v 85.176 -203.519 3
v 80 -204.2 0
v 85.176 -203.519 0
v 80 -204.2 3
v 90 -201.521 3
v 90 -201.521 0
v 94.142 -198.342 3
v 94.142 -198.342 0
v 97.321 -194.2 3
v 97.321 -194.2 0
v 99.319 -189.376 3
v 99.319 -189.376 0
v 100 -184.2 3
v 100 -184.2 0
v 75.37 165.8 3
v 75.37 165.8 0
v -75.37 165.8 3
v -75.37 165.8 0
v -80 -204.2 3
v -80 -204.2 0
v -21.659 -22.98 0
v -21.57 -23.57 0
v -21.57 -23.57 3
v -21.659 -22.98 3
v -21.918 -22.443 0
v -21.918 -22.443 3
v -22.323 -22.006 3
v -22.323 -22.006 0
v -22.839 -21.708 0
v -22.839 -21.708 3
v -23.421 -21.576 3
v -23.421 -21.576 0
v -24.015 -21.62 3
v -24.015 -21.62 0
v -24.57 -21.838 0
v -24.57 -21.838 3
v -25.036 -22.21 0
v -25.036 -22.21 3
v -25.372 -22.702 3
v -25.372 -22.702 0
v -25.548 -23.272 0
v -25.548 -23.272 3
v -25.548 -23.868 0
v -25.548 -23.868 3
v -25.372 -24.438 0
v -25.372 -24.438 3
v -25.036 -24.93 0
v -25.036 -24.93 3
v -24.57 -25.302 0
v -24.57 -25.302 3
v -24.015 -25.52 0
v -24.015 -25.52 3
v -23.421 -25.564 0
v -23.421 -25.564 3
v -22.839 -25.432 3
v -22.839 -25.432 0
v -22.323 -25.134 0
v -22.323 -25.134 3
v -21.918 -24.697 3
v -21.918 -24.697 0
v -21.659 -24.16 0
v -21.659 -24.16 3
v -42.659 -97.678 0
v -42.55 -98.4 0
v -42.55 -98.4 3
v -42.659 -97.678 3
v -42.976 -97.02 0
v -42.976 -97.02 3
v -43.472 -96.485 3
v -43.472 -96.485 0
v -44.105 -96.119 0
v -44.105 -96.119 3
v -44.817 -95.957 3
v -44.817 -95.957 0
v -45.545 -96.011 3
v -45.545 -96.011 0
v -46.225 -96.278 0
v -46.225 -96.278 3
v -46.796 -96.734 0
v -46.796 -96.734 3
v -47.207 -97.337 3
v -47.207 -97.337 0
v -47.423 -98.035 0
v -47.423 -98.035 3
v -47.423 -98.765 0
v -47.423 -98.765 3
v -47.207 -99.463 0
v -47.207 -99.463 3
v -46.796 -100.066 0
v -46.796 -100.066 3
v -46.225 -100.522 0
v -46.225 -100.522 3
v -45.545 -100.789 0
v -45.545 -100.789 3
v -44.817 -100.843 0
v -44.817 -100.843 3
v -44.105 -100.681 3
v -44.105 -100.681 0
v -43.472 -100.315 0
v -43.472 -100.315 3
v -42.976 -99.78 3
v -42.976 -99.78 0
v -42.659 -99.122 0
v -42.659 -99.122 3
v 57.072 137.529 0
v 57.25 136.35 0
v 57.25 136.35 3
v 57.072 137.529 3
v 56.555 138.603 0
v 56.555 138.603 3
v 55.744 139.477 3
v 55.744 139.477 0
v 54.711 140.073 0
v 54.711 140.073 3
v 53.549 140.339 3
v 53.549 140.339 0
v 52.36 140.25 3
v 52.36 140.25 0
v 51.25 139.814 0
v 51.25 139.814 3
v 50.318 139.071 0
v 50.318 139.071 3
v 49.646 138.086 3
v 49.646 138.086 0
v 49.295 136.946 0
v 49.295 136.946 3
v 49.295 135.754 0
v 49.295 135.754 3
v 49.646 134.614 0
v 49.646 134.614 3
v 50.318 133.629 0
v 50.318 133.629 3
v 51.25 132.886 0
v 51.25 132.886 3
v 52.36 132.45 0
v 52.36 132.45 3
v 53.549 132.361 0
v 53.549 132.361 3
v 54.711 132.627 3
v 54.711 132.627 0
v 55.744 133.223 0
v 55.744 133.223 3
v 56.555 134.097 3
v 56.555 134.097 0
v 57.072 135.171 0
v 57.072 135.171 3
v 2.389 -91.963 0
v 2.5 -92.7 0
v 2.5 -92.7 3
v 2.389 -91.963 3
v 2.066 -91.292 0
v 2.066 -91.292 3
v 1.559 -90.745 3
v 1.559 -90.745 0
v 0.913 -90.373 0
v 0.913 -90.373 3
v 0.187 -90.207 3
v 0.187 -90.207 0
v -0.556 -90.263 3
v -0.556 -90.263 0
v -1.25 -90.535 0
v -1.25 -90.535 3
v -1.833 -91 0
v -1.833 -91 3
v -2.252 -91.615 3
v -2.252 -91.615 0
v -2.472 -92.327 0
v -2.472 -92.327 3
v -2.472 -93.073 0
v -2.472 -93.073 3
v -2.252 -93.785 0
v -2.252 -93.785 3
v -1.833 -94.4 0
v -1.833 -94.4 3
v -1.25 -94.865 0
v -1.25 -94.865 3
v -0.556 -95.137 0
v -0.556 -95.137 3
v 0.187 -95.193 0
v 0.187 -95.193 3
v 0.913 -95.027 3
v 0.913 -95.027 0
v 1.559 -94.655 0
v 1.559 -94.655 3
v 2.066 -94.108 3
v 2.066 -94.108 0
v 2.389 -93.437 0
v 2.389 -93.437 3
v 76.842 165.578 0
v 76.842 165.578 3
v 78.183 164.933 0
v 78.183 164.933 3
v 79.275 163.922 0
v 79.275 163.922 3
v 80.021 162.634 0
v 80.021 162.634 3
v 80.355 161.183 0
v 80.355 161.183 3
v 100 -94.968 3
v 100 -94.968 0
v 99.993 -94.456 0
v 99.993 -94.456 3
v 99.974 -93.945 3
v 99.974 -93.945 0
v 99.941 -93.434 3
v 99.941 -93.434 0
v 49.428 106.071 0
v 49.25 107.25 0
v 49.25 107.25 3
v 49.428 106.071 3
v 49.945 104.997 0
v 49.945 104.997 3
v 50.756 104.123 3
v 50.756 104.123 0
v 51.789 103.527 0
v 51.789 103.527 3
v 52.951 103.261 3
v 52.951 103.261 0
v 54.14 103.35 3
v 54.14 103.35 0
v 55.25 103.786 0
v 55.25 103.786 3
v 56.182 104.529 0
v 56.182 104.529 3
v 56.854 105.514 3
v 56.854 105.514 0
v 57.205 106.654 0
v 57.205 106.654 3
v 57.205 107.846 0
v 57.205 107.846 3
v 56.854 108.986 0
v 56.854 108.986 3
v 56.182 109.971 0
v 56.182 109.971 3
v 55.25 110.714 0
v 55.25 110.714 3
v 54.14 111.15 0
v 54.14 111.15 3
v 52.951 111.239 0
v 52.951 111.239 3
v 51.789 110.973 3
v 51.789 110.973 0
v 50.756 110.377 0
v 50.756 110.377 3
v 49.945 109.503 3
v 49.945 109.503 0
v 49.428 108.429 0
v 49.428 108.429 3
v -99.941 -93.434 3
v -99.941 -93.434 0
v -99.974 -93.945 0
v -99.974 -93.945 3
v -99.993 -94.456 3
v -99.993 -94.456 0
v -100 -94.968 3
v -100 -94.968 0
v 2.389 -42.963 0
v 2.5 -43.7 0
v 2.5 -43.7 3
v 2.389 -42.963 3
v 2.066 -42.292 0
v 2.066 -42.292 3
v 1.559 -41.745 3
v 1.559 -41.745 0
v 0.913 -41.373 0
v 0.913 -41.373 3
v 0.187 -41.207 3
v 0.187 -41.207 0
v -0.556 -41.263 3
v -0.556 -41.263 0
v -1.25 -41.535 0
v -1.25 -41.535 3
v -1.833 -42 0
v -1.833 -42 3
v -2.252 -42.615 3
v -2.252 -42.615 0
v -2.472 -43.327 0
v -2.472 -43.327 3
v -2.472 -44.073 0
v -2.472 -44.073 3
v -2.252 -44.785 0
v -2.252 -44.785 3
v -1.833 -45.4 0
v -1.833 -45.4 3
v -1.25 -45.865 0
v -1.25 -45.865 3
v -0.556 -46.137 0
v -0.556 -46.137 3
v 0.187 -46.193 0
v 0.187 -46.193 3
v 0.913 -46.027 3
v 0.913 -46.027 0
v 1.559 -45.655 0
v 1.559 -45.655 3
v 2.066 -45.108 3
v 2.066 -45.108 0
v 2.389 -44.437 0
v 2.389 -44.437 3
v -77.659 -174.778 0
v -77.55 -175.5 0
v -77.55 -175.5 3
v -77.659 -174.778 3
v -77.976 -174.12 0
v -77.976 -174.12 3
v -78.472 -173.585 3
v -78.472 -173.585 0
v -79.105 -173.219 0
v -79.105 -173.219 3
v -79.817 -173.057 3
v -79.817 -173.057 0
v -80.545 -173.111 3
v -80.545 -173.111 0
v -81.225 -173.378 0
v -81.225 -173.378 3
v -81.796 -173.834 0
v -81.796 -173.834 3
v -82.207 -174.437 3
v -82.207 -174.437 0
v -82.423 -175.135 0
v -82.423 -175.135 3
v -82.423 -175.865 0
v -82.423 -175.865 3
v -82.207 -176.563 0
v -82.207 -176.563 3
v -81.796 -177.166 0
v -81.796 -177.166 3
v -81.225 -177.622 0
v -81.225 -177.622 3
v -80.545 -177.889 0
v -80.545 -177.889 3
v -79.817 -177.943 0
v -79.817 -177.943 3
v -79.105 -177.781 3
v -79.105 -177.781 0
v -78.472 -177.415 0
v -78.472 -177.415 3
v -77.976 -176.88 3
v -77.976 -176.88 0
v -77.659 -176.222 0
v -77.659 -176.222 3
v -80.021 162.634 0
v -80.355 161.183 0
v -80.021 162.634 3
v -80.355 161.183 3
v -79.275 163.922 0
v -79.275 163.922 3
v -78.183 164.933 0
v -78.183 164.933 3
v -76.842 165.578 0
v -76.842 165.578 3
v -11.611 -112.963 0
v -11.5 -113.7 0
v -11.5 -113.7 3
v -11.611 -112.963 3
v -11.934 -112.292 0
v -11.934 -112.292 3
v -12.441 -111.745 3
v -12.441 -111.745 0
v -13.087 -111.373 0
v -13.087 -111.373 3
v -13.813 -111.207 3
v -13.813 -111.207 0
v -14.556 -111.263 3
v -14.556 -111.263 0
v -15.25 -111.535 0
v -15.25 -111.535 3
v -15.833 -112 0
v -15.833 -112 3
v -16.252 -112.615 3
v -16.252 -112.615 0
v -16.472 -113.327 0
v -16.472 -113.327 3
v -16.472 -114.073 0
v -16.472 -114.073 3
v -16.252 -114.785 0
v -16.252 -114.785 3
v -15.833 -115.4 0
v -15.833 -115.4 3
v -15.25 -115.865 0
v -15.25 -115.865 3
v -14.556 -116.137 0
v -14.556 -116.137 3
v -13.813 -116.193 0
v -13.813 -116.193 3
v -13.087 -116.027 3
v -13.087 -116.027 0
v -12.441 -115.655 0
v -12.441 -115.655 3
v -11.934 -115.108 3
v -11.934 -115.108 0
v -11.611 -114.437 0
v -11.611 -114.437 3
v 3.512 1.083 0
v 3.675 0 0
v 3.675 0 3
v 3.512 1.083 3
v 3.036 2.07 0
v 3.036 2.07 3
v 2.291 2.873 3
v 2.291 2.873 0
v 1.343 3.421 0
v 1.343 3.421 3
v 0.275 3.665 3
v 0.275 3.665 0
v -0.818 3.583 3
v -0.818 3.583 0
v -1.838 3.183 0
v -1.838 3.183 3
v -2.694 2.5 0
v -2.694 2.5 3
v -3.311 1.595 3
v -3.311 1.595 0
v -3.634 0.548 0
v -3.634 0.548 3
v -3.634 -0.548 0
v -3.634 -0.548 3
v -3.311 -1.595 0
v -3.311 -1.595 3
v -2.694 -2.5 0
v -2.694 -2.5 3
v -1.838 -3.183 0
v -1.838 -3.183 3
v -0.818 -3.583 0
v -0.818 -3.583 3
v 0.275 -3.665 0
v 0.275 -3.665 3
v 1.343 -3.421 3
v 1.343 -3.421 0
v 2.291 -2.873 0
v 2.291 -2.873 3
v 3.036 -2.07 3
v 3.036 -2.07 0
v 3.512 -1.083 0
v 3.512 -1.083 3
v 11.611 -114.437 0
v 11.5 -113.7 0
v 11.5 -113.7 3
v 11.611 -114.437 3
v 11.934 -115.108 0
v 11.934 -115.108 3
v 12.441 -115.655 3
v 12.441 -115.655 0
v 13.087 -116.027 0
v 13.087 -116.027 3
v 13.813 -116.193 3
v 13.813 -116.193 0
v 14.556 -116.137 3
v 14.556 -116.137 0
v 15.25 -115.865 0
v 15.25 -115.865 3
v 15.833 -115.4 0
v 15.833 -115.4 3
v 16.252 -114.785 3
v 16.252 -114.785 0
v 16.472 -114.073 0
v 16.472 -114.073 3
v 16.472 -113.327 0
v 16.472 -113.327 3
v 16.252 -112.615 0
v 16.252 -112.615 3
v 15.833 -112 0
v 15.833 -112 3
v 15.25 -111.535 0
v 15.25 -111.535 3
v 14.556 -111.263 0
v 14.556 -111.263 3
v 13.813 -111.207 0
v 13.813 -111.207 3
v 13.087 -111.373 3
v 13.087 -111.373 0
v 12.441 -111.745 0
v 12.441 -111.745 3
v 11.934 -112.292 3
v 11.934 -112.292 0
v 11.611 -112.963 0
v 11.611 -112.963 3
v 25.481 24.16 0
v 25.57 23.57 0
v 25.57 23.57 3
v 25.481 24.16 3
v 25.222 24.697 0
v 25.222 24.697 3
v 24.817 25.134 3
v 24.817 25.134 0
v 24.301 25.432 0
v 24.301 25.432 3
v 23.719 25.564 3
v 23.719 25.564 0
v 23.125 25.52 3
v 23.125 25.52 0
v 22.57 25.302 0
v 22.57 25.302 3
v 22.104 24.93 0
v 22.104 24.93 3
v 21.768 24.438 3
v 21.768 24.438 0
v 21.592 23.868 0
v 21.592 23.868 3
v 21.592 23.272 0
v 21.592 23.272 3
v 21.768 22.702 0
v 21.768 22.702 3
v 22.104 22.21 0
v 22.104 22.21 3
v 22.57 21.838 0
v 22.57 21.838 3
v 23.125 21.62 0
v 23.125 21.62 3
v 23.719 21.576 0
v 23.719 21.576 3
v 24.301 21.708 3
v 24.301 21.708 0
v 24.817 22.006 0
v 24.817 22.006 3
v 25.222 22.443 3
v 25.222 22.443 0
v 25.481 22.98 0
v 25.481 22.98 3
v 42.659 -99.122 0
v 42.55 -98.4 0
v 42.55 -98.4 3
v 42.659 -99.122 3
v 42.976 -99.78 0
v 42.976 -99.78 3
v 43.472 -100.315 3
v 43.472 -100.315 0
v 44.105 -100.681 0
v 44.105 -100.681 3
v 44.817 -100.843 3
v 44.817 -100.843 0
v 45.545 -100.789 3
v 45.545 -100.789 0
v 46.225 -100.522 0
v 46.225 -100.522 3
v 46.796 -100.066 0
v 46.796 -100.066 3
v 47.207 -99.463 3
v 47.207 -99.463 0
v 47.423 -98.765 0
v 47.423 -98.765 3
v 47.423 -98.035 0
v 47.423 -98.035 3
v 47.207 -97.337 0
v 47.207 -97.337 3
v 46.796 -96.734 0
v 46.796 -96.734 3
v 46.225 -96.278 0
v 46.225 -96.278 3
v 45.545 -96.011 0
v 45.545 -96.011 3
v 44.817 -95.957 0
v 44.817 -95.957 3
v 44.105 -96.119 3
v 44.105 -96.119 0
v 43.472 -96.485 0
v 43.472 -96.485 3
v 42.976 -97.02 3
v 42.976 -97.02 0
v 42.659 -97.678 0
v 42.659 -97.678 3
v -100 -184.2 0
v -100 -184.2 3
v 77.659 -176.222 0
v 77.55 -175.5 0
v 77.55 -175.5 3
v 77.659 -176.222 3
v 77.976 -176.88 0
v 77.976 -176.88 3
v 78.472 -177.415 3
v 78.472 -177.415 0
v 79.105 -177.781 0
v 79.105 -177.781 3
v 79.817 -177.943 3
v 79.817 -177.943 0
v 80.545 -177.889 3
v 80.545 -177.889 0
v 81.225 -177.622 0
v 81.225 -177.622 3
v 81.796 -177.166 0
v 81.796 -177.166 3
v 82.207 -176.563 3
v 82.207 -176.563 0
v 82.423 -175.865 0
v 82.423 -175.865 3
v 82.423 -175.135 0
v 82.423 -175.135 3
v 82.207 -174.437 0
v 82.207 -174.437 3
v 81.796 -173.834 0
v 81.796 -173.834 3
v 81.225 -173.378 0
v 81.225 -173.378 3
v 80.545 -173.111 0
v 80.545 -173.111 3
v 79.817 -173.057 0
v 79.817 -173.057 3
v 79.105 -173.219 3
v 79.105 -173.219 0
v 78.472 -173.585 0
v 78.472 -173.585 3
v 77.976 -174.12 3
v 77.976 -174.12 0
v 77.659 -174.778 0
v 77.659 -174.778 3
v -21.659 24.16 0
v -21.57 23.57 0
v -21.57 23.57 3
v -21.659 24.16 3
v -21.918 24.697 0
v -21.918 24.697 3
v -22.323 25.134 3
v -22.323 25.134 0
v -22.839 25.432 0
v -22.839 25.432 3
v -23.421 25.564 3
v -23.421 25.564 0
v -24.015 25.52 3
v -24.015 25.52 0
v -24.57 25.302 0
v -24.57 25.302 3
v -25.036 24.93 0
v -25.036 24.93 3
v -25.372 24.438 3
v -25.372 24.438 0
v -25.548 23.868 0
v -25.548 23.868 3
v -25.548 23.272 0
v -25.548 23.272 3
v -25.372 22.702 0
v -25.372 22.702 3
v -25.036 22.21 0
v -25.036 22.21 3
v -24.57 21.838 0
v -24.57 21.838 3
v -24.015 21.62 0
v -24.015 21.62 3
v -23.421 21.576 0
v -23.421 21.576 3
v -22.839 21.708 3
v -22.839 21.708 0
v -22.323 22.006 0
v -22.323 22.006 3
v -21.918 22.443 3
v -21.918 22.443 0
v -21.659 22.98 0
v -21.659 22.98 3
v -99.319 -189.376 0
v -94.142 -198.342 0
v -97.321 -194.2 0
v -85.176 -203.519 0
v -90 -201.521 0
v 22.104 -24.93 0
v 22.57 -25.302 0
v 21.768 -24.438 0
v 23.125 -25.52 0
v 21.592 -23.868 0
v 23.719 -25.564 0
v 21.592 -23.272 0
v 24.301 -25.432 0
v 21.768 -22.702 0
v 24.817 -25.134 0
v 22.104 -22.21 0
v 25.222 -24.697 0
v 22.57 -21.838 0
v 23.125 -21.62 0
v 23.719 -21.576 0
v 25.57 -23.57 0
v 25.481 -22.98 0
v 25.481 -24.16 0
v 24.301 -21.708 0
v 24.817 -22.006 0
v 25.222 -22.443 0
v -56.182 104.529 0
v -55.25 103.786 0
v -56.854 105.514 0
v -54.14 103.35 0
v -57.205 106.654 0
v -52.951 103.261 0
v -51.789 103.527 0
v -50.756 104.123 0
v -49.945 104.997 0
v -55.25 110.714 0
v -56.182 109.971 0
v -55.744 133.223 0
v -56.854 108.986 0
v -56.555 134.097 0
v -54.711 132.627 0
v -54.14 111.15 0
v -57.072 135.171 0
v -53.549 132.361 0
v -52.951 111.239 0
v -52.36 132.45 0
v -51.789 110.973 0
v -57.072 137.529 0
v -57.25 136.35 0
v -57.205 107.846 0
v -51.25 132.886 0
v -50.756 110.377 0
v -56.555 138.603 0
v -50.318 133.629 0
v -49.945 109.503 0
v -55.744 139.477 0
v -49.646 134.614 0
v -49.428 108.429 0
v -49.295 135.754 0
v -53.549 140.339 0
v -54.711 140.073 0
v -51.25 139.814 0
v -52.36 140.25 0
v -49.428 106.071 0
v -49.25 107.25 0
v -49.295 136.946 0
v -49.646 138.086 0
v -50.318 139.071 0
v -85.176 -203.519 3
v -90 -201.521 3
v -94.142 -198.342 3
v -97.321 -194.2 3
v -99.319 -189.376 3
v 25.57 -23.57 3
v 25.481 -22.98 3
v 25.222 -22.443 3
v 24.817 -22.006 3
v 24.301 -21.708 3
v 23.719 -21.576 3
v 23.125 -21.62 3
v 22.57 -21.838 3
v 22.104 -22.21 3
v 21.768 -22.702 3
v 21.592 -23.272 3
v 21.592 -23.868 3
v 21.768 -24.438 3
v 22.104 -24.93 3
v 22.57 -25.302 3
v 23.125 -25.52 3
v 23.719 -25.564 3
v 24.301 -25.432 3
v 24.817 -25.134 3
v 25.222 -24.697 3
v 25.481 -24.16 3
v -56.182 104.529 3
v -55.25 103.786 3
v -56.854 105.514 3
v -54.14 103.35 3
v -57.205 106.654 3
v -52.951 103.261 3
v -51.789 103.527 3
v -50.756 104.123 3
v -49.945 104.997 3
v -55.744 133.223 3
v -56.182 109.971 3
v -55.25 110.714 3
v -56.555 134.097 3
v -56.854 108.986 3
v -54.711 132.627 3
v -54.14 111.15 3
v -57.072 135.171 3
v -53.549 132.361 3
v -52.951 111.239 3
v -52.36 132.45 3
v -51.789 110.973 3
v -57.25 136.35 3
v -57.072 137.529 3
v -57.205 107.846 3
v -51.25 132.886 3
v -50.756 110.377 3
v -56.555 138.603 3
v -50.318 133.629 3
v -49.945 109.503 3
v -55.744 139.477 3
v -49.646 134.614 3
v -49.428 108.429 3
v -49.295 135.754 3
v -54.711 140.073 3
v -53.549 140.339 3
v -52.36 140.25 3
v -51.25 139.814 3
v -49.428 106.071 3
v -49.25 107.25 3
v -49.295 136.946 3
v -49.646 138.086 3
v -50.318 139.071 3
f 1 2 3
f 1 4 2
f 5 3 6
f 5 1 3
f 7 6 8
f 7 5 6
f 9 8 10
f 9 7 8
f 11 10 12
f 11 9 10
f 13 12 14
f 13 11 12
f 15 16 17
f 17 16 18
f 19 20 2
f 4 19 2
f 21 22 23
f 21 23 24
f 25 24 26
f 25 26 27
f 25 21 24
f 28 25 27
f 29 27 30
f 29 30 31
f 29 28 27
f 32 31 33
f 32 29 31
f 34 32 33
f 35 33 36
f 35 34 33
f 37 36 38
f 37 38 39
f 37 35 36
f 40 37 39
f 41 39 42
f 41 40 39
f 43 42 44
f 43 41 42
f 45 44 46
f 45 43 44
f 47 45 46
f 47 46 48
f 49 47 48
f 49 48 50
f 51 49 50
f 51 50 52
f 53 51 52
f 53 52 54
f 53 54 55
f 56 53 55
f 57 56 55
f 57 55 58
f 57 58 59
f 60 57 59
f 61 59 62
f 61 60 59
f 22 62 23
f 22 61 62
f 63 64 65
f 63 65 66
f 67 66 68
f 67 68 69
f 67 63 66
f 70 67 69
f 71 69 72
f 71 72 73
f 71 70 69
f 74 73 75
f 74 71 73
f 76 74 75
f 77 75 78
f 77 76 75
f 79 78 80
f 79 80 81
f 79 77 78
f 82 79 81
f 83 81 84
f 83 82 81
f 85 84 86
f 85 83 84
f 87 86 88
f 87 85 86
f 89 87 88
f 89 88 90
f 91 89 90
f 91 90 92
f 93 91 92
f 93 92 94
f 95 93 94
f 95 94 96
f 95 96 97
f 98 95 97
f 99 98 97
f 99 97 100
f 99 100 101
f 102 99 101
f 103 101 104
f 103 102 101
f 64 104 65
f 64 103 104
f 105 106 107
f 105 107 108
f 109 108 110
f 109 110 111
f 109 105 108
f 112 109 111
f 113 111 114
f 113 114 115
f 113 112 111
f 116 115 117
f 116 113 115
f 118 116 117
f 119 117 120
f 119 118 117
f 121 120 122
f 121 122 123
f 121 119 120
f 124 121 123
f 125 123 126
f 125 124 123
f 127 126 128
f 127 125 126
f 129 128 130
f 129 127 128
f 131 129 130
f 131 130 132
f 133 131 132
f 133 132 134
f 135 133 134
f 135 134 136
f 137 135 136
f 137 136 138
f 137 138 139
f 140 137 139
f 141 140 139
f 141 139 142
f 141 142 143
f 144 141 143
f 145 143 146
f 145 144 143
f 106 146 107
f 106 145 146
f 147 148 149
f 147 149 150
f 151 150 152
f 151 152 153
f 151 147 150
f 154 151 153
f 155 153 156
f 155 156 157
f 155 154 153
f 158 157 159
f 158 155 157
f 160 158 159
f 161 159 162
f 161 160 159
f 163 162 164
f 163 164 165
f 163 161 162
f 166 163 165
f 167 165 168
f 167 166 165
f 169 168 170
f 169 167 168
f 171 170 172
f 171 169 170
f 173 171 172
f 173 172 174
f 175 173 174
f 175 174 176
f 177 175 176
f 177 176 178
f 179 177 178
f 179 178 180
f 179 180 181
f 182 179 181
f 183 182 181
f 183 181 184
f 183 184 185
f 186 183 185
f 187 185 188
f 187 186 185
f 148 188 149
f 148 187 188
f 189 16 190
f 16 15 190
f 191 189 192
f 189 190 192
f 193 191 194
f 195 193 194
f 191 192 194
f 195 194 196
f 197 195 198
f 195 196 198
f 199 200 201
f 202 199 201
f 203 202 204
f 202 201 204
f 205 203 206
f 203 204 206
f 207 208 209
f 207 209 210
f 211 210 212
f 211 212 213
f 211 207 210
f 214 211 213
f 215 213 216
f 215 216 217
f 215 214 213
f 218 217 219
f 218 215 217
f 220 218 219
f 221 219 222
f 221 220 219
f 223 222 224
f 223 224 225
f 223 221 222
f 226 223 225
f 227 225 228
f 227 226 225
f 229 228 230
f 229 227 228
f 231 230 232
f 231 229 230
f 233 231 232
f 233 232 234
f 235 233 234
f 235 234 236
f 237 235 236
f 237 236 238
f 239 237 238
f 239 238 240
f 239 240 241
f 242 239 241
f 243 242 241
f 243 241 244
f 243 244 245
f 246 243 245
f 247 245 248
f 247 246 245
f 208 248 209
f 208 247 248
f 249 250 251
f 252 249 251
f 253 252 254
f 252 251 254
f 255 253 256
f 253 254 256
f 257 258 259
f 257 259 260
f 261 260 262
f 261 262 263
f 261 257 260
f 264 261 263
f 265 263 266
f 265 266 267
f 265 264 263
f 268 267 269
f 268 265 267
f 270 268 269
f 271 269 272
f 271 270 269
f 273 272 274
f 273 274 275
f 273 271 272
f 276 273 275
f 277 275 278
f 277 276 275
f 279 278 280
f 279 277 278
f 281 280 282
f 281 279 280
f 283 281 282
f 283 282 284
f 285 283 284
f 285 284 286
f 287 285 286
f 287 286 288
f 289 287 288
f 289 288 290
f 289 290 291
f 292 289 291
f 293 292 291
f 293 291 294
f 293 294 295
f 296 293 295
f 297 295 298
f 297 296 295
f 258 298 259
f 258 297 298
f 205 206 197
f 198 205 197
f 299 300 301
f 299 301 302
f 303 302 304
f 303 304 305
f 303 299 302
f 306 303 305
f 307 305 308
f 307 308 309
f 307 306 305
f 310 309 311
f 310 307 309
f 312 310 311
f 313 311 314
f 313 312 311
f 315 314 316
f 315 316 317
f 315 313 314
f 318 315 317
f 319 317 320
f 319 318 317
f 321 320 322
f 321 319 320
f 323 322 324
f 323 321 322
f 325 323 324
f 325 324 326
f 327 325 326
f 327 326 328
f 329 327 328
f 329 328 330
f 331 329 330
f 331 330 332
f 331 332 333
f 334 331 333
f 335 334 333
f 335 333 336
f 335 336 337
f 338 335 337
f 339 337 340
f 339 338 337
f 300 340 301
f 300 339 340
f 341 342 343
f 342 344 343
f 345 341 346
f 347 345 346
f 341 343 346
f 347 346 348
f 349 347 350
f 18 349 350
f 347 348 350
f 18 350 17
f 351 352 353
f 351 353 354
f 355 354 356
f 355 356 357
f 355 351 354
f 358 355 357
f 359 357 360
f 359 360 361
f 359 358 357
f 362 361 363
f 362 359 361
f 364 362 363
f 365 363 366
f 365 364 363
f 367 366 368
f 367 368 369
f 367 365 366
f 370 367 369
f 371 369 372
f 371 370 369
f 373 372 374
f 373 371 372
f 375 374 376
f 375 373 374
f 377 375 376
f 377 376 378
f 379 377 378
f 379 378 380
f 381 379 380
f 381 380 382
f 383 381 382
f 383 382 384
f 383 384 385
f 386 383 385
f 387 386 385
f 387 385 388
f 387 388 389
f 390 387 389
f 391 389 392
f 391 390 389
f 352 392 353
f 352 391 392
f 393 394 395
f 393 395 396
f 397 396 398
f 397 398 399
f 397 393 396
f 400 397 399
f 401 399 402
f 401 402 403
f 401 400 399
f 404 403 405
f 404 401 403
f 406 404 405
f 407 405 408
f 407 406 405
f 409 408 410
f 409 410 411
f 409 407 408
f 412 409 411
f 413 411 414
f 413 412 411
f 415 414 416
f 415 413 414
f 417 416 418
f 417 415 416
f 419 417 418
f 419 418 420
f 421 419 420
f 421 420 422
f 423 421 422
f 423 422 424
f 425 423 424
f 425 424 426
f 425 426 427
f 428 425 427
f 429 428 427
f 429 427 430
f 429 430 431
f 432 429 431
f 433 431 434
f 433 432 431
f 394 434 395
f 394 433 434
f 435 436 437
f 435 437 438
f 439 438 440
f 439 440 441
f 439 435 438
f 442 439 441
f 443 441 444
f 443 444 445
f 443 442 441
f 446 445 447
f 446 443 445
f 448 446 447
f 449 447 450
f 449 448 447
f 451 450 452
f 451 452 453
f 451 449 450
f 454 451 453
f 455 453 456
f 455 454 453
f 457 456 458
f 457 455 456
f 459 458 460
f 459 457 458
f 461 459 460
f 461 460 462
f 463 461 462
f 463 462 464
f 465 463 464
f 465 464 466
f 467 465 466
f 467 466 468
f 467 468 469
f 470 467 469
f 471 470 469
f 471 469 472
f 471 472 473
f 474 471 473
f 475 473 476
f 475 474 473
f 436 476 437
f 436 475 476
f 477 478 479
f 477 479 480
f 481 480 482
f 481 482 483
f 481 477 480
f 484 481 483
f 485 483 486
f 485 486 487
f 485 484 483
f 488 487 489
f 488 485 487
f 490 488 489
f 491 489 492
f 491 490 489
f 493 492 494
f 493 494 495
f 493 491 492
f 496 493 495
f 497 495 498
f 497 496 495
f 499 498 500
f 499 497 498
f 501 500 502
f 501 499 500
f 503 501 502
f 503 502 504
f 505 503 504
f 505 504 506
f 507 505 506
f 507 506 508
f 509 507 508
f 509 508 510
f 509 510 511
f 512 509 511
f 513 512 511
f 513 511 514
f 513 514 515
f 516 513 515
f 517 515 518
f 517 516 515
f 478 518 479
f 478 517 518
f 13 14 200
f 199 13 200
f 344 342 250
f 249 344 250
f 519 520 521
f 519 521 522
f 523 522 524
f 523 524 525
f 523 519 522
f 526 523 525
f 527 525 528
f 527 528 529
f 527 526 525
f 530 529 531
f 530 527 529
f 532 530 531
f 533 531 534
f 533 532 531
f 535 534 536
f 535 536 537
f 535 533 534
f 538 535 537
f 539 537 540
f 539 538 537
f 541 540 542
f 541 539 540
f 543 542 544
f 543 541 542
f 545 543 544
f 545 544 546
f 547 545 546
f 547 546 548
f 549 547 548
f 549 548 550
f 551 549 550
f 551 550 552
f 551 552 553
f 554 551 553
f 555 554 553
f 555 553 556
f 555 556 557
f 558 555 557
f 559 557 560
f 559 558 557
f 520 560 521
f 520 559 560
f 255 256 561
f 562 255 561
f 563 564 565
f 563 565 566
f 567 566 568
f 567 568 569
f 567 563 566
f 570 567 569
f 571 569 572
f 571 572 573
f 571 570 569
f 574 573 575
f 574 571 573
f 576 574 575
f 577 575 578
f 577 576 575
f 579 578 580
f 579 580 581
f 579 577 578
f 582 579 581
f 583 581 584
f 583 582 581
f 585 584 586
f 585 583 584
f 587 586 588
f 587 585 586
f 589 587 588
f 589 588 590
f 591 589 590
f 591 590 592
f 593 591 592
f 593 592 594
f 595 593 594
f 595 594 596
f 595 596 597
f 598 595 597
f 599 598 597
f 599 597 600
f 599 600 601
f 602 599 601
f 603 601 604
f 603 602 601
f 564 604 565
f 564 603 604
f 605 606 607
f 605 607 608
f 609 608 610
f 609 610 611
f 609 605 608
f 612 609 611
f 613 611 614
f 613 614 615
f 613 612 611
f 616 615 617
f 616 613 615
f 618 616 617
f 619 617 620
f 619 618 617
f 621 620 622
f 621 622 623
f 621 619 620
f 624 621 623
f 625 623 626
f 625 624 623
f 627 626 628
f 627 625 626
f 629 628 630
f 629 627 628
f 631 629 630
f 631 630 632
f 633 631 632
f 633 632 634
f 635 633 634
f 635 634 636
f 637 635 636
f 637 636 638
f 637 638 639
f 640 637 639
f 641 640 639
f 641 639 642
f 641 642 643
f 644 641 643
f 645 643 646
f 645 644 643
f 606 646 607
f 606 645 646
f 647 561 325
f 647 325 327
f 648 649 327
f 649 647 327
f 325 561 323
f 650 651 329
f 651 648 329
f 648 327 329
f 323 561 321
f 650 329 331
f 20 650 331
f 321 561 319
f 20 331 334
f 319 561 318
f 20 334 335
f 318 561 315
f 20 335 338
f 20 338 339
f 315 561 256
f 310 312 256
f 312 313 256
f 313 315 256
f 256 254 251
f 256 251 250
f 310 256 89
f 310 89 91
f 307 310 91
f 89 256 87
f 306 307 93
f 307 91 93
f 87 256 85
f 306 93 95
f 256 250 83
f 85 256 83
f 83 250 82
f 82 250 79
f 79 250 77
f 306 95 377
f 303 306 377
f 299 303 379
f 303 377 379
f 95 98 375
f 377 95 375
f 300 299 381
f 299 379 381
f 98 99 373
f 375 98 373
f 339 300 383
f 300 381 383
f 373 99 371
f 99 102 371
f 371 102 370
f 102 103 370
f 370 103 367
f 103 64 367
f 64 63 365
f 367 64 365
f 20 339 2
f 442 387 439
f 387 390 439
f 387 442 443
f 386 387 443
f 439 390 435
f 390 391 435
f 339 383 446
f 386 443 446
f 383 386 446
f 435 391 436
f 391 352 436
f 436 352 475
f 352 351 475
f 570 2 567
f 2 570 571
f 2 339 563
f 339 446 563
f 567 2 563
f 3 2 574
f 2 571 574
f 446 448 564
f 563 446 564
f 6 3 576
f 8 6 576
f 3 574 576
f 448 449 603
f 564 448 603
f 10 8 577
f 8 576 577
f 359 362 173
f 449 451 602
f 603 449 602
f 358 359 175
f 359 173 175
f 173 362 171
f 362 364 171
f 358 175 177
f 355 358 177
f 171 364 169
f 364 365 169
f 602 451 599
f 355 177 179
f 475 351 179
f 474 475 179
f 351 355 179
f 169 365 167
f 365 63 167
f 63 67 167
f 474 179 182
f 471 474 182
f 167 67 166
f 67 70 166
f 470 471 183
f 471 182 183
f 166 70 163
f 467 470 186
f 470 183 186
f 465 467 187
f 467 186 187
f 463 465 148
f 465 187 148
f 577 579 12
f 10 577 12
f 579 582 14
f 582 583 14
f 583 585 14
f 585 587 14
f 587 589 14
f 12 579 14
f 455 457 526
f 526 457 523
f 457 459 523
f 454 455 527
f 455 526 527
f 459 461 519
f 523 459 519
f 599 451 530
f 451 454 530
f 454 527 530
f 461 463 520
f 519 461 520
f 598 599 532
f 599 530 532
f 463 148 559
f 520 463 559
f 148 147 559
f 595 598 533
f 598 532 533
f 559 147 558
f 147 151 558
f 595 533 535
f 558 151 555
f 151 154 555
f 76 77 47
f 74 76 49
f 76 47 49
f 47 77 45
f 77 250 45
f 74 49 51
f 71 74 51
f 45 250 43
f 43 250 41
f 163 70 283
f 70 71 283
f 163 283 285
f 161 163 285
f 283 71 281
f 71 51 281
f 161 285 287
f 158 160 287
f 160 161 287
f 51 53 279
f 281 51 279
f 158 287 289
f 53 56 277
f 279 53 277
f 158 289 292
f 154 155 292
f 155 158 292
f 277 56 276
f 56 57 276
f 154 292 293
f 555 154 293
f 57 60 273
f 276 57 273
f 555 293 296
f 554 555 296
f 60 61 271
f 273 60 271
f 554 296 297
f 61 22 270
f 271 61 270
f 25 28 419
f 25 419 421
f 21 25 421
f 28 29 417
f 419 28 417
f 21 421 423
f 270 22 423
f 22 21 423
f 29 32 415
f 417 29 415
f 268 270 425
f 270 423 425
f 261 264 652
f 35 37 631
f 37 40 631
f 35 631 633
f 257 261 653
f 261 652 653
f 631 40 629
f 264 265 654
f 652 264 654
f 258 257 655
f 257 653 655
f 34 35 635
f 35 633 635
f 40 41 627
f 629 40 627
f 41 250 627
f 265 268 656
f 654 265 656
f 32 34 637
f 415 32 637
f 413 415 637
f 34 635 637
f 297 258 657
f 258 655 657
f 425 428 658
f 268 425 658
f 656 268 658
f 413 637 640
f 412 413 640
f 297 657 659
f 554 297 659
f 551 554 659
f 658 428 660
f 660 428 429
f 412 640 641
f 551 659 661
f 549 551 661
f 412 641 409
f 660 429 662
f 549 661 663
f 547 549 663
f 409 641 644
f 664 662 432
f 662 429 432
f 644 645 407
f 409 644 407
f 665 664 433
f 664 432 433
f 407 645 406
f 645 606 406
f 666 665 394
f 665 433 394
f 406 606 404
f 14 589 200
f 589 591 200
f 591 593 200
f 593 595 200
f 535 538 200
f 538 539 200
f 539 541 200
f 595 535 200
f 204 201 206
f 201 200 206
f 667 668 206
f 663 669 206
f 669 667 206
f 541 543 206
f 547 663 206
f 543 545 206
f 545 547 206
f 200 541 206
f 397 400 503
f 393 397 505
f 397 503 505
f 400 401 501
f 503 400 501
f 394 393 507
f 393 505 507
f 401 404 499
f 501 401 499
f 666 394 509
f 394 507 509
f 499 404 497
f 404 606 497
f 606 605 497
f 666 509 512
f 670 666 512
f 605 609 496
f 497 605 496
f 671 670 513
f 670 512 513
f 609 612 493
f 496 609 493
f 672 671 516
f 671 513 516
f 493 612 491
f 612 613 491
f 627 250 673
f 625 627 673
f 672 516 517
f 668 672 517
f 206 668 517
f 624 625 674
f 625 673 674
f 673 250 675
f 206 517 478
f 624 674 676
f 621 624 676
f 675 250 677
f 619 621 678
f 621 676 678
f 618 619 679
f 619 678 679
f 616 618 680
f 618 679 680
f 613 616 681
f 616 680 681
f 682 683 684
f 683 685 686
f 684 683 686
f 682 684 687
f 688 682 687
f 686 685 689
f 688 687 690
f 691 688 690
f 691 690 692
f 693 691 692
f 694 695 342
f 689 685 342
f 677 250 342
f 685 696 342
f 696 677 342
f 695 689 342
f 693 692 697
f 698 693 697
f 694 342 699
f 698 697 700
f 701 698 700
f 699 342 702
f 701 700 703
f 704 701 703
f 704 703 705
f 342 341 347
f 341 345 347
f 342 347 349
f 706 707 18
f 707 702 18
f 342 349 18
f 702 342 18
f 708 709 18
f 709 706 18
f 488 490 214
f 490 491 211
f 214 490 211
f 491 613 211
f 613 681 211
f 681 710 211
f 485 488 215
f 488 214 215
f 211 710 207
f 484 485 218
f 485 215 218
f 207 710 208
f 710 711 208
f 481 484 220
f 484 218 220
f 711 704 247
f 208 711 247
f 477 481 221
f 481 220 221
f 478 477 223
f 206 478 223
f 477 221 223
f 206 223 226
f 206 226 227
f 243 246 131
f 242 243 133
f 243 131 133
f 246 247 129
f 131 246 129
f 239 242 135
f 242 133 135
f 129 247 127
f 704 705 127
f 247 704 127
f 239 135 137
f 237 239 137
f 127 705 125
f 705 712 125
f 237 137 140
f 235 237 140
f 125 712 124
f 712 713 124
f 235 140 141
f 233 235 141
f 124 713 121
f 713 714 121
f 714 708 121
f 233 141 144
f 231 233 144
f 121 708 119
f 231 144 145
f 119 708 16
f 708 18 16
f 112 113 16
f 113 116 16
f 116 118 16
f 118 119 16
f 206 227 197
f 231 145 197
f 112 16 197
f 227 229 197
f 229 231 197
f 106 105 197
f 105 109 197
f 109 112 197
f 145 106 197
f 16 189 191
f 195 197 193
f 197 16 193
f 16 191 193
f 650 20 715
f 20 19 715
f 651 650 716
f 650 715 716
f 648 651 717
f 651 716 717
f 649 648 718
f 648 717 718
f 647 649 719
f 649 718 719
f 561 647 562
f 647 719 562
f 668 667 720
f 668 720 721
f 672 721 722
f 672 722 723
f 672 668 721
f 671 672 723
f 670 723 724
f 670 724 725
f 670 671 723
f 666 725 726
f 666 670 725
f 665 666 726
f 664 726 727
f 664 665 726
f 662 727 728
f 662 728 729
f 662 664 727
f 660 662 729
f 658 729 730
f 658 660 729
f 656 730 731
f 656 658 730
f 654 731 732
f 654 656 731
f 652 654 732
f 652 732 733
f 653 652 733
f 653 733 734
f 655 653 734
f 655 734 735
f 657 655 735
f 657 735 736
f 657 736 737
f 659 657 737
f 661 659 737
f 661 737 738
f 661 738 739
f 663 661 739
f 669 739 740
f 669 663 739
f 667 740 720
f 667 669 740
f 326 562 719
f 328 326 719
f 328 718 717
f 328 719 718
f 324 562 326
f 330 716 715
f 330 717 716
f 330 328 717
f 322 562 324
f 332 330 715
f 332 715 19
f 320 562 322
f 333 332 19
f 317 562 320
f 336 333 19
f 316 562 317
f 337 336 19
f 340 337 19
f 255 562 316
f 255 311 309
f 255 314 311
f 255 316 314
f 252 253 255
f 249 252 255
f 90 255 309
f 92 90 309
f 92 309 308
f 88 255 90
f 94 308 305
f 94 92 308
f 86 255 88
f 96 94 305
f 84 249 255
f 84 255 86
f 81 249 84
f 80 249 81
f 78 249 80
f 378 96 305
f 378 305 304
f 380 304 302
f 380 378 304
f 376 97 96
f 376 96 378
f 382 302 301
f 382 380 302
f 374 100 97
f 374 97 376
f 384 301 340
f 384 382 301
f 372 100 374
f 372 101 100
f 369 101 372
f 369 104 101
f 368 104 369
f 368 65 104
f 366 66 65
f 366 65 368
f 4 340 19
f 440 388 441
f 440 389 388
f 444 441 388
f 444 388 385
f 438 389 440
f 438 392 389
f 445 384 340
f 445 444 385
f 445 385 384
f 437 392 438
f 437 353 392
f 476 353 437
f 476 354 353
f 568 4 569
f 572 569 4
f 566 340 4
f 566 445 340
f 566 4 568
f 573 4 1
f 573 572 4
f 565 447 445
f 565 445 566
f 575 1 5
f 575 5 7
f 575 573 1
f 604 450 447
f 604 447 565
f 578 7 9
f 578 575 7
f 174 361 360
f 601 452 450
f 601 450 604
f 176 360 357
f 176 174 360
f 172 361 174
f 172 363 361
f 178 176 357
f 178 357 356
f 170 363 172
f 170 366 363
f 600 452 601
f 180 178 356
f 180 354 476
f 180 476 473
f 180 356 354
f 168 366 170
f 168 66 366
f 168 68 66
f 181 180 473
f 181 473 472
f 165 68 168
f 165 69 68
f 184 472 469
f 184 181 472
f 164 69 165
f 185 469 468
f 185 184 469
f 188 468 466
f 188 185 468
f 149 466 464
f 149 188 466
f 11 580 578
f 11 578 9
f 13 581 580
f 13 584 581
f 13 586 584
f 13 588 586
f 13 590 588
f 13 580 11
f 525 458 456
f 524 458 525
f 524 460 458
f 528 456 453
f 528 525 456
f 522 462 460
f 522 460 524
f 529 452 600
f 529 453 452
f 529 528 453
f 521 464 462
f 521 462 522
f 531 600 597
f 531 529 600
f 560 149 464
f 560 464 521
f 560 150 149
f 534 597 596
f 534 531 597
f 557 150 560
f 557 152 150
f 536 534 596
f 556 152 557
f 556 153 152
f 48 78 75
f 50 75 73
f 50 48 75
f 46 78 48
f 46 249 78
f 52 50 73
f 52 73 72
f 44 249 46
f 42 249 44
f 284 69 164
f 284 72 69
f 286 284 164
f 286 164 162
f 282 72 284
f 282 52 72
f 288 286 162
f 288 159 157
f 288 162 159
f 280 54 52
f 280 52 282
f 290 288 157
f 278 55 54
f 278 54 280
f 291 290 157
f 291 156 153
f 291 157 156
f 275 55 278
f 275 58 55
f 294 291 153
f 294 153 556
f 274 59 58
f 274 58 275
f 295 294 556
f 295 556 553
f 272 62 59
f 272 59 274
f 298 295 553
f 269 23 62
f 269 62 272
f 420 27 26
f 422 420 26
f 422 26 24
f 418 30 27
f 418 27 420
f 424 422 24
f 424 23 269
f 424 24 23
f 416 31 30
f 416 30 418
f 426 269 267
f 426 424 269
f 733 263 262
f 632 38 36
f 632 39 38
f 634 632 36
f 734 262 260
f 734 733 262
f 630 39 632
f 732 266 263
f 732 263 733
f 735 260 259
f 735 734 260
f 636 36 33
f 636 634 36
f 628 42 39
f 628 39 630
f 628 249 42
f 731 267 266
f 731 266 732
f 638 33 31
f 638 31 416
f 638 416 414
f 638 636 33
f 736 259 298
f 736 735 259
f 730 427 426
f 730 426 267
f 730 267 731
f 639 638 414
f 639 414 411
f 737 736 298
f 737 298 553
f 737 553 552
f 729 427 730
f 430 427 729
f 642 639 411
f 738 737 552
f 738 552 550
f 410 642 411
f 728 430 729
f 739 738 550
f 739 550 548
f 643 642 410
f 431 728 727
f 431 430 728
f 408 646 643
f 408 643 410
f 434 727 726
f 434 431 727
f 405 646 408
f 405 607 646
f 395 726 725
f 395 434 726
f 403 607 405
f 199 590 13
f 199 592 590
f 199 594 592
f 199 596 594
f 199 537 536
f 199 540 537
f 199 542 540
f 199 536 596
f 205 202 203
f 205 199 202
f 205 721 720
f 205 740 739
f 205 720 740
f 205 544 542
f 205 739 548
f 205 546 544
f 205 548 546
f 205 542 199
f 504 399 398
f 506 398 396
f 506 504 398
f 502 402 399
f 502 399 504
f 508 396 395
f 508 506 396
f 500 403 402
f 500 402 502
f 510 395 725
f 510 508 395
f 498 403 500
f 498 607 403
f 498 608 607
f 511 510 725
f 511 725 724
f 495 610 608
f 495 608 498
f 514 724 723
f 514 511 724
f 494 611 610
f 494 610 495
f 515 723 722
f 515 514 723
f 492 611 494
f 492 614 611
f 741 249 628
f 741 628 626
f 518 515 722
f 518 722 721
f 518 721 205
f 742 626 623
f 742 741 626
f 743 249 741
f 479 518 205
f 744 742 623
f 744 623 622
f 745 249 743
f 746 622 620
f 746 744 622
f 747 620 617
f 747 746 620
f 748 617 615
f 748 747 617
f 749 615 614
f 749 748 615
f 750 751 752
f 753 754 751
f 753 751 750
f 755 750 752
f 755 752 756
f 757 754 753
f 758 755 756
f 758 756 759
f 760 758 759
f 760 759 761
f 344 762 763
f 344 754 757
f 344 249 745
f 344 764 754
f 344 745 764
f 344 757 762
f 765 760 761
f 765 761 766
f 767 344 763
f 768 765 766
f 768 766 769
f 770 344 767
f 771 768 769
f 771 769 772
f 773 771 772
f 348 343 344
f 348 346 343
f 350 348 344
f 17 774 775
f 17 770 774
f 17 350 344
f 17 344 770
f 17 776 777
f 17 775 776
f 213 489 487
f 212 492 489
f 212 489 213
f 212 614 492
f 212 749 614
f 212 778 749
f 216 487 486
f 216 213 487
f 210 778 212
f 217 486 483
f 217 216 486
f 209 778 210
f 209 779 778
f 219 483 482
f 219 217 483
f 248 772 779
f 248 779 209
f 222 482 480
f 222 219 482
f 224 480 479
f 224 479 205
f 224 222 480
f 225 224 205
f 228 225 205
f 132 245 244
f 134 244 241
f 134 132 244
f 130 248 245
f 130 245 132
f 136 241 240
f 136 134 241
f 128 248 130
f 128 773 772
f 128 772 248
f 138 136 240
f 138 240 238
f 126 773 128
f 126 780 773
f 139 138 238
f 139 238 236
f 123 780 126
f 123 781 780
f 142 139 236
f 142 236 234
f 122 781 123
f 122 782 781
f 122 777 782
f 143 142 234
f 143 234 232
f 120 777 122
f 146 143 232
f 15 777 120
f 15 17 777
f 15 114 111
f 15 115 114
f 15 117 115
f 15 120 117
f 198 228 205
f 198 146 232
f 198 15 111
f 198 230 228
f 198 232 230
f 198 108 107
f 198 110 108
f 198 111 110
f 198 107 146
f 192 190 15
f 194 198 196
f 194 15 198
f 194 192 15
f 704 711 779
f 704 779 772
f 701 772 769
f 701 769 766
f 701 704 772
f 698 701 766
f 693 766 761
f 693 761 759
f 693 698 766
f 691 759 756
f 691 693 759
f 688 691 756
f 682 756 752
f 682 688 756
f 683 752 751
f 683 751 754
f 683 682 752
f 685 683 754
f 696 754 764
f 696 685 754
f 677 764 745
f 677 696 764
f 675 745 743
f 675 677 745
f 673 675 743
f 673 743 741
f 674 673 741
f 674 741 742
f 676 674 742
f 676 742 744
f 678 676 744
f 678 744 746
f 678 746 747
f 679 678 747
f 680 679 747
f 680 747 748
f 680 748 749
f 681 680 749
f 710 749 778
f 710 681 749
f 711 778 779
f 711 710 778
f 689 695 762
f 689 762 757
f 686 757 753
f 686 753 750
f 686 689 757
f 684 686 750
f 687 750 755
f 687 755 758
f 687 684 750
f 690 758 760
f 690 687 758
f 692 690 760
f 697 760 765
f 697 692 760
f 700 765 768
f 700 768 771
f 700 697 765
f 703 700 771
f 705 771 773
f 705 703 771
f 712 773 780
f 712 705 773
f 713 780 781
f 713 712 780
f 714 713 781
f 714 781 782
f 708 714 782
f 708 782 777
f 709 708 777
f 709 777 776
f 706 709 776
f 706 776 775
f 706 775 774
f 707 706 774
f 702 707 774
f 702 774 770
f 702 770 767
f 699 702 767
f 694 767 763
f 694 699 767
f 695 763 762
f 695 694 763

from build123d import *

# Parameters (mm, degrees)
CROQUIS1_R              = 2
CROQUIS1_R_2            = 3.675
CROQUIS1_R_3            = 2.5
CROQUIS1_R_4            = 2.45
CROQUIS1_R_5            = 4
SALIENTE_EXTRUIR1_DEPTH = 3
REDONDEO1_R             = 20
REDONDEO2_R             = 20
REDONDEO3_R             = 5


with BuildPart() as part:
    # Croquis1 → Saliente-Extruir1 (new body)
    with BuildSketch(Plane.XY):
        Polygon((-100, -204.2), (100, -204.2), (100, -94.2), (80, 165.8), (-80, 165.8), (-100, -94.2), align=None)
        with Locations((-23.57, 23.57)):
            Circle(CROQUIS1_R, mode=Mode.SUBTRACT)
        with Locations((23.57, 23.57)):
            Circle(CROQUIS1_R, mode=Mode.SUBTRACT)
        with Locations((-23.57, -23.57)):
            Circle(CROQUIS1_R, mode=Mode.SUBTRACT)
        with Locations((23.57, -23.57)):
            Circle(CROQUIS1_R, mode=Mode.SUBTRACT)
        Circle(CROQUIS1_R_2, mode=Mode.SUBTRACT)
        with Locations((-14, -113.7)):
            Circle(CROQUIS1_R_3, mode=Mode.SUBTRACT)
        with Locations(Location((14, -113.7, 0), (0, 0, 180))):
            Circle(CROQUIS1_R_3, mode=Mode.SUBTRACT)
        with Locations((-45, -98.4)):
            Circle(CROQUIS1_R_4, mode=Mode.SUBTRACT)
        with Locations(Location((45, -98.4, 0), (0, 0, 180))):
            Circle(CROQUIS1_R_4, mode=Mode.SUBTRACT)
        with Locations((-80, -175.5)):
            Circle(CROQUIS1_R_4, mode=Mode.SUBTRACT)
        with Locations(Location((80, -175.5, 0), (0, 0, 180))):
            Circle(CROQUIS1_R_4, mode=Mode.SUBTRACT)
        with Locations((0, -43.7)):
            Circle(CROQUIS1_R_3, mode=Mode.SUBTRACT)
        with Locations((0, -92.7)):
            Circle(CROQUIS1_R_3, mode=Mode.SUBTRACT)
        with Locations((53.25, 136.35)):
            Circle(CROQUIS1_R_5, mode=Mode.SUBTRACT)
        with Locations(Location((53.25, 107.25, 0), (0, 0, 180))):
            Circle(CROQUIS1_R_5, mode=Mode.SUBTRACT)
        with Locations((-53.25, 107.25)):
            Circle(CROQUIS1_R_5, mode=Mode.SUBTRACT)
        with Locations(Location((-53.25, 136.35, 0), (0, 0, 180))):
            Circle(CROQUIS1_R_5, mode=Mode.SUBTRACT)
    extrude(amount=SALIENTE_EXTRUIR1_DEPTH)

    # Redondeo1
    redondeo1_edges = [part.edges().sort_by_distance(p)[0] for p in [
        (100, -204.2, 1.5),
        (-100, -204.2, 1.5),
    ]]
    fillet(redondeo1_edges, radius=REDONDEO1_R)

    # Redondeo2
    # the kernel refuses this fillet: 20 mm, written as the material it takes off along each edge
    with BuildSketch(Plane(origin=(100, -94.2, -1.92024052), x_dir=(0, -1, 0), z_dir=(0, 0, 1))) as redondeo2_piece_1:
        with BuildLine():
            CenterArc((REDONDEO2_R * 0.0384048104053, -REDONDEO2_R), REDONDEO2_R, 90, 4.398705355)
            Line((-REDONDEO2_R * 0.0382916884794, -REDONDEO2_R * 0.00294551449842), (0, 0))
            Line((0, 0), (REDONDEO2_R * 0.0384048104053, 0))
        make_face()
    extrude(amount=6.840481041, mode=Mode.SUBTRACT)
    with BuildSketch(Plane(origin=(-100, -94.2, -1.92024052), x_dir=(0, -1, 0), z_dir=(0, 0, 1))) as redondeo2_piece_2:
        with BuildLine():
            CenterArc((REDONDEO2_R * 0.0384048104053, REDONDEO2_R), REDONDEO2_R, 265.601294645, 4.398705355)
            Line((-REDONDEO2_R * 0.0382916884794, REDONDEO2_R * 0.00294551449842), (0, 0))
            Line((0, 0), (REDONDEO2_R * 0.0384048104053, 0))
        make_face()
    extrude(amount=6.840481041, mode=Mode.SUBTRACT)

    # Redondeo3
    redondeo3_edges = [part.edges().sort_by_distance(p)[0] for p in [
        (80, 165.8, 1.5),
        (-80, 165.8, 1.5),
    ]]
    fillet(redondeo3_edges, radius=REDONDEO3_R)


solid = part.part
